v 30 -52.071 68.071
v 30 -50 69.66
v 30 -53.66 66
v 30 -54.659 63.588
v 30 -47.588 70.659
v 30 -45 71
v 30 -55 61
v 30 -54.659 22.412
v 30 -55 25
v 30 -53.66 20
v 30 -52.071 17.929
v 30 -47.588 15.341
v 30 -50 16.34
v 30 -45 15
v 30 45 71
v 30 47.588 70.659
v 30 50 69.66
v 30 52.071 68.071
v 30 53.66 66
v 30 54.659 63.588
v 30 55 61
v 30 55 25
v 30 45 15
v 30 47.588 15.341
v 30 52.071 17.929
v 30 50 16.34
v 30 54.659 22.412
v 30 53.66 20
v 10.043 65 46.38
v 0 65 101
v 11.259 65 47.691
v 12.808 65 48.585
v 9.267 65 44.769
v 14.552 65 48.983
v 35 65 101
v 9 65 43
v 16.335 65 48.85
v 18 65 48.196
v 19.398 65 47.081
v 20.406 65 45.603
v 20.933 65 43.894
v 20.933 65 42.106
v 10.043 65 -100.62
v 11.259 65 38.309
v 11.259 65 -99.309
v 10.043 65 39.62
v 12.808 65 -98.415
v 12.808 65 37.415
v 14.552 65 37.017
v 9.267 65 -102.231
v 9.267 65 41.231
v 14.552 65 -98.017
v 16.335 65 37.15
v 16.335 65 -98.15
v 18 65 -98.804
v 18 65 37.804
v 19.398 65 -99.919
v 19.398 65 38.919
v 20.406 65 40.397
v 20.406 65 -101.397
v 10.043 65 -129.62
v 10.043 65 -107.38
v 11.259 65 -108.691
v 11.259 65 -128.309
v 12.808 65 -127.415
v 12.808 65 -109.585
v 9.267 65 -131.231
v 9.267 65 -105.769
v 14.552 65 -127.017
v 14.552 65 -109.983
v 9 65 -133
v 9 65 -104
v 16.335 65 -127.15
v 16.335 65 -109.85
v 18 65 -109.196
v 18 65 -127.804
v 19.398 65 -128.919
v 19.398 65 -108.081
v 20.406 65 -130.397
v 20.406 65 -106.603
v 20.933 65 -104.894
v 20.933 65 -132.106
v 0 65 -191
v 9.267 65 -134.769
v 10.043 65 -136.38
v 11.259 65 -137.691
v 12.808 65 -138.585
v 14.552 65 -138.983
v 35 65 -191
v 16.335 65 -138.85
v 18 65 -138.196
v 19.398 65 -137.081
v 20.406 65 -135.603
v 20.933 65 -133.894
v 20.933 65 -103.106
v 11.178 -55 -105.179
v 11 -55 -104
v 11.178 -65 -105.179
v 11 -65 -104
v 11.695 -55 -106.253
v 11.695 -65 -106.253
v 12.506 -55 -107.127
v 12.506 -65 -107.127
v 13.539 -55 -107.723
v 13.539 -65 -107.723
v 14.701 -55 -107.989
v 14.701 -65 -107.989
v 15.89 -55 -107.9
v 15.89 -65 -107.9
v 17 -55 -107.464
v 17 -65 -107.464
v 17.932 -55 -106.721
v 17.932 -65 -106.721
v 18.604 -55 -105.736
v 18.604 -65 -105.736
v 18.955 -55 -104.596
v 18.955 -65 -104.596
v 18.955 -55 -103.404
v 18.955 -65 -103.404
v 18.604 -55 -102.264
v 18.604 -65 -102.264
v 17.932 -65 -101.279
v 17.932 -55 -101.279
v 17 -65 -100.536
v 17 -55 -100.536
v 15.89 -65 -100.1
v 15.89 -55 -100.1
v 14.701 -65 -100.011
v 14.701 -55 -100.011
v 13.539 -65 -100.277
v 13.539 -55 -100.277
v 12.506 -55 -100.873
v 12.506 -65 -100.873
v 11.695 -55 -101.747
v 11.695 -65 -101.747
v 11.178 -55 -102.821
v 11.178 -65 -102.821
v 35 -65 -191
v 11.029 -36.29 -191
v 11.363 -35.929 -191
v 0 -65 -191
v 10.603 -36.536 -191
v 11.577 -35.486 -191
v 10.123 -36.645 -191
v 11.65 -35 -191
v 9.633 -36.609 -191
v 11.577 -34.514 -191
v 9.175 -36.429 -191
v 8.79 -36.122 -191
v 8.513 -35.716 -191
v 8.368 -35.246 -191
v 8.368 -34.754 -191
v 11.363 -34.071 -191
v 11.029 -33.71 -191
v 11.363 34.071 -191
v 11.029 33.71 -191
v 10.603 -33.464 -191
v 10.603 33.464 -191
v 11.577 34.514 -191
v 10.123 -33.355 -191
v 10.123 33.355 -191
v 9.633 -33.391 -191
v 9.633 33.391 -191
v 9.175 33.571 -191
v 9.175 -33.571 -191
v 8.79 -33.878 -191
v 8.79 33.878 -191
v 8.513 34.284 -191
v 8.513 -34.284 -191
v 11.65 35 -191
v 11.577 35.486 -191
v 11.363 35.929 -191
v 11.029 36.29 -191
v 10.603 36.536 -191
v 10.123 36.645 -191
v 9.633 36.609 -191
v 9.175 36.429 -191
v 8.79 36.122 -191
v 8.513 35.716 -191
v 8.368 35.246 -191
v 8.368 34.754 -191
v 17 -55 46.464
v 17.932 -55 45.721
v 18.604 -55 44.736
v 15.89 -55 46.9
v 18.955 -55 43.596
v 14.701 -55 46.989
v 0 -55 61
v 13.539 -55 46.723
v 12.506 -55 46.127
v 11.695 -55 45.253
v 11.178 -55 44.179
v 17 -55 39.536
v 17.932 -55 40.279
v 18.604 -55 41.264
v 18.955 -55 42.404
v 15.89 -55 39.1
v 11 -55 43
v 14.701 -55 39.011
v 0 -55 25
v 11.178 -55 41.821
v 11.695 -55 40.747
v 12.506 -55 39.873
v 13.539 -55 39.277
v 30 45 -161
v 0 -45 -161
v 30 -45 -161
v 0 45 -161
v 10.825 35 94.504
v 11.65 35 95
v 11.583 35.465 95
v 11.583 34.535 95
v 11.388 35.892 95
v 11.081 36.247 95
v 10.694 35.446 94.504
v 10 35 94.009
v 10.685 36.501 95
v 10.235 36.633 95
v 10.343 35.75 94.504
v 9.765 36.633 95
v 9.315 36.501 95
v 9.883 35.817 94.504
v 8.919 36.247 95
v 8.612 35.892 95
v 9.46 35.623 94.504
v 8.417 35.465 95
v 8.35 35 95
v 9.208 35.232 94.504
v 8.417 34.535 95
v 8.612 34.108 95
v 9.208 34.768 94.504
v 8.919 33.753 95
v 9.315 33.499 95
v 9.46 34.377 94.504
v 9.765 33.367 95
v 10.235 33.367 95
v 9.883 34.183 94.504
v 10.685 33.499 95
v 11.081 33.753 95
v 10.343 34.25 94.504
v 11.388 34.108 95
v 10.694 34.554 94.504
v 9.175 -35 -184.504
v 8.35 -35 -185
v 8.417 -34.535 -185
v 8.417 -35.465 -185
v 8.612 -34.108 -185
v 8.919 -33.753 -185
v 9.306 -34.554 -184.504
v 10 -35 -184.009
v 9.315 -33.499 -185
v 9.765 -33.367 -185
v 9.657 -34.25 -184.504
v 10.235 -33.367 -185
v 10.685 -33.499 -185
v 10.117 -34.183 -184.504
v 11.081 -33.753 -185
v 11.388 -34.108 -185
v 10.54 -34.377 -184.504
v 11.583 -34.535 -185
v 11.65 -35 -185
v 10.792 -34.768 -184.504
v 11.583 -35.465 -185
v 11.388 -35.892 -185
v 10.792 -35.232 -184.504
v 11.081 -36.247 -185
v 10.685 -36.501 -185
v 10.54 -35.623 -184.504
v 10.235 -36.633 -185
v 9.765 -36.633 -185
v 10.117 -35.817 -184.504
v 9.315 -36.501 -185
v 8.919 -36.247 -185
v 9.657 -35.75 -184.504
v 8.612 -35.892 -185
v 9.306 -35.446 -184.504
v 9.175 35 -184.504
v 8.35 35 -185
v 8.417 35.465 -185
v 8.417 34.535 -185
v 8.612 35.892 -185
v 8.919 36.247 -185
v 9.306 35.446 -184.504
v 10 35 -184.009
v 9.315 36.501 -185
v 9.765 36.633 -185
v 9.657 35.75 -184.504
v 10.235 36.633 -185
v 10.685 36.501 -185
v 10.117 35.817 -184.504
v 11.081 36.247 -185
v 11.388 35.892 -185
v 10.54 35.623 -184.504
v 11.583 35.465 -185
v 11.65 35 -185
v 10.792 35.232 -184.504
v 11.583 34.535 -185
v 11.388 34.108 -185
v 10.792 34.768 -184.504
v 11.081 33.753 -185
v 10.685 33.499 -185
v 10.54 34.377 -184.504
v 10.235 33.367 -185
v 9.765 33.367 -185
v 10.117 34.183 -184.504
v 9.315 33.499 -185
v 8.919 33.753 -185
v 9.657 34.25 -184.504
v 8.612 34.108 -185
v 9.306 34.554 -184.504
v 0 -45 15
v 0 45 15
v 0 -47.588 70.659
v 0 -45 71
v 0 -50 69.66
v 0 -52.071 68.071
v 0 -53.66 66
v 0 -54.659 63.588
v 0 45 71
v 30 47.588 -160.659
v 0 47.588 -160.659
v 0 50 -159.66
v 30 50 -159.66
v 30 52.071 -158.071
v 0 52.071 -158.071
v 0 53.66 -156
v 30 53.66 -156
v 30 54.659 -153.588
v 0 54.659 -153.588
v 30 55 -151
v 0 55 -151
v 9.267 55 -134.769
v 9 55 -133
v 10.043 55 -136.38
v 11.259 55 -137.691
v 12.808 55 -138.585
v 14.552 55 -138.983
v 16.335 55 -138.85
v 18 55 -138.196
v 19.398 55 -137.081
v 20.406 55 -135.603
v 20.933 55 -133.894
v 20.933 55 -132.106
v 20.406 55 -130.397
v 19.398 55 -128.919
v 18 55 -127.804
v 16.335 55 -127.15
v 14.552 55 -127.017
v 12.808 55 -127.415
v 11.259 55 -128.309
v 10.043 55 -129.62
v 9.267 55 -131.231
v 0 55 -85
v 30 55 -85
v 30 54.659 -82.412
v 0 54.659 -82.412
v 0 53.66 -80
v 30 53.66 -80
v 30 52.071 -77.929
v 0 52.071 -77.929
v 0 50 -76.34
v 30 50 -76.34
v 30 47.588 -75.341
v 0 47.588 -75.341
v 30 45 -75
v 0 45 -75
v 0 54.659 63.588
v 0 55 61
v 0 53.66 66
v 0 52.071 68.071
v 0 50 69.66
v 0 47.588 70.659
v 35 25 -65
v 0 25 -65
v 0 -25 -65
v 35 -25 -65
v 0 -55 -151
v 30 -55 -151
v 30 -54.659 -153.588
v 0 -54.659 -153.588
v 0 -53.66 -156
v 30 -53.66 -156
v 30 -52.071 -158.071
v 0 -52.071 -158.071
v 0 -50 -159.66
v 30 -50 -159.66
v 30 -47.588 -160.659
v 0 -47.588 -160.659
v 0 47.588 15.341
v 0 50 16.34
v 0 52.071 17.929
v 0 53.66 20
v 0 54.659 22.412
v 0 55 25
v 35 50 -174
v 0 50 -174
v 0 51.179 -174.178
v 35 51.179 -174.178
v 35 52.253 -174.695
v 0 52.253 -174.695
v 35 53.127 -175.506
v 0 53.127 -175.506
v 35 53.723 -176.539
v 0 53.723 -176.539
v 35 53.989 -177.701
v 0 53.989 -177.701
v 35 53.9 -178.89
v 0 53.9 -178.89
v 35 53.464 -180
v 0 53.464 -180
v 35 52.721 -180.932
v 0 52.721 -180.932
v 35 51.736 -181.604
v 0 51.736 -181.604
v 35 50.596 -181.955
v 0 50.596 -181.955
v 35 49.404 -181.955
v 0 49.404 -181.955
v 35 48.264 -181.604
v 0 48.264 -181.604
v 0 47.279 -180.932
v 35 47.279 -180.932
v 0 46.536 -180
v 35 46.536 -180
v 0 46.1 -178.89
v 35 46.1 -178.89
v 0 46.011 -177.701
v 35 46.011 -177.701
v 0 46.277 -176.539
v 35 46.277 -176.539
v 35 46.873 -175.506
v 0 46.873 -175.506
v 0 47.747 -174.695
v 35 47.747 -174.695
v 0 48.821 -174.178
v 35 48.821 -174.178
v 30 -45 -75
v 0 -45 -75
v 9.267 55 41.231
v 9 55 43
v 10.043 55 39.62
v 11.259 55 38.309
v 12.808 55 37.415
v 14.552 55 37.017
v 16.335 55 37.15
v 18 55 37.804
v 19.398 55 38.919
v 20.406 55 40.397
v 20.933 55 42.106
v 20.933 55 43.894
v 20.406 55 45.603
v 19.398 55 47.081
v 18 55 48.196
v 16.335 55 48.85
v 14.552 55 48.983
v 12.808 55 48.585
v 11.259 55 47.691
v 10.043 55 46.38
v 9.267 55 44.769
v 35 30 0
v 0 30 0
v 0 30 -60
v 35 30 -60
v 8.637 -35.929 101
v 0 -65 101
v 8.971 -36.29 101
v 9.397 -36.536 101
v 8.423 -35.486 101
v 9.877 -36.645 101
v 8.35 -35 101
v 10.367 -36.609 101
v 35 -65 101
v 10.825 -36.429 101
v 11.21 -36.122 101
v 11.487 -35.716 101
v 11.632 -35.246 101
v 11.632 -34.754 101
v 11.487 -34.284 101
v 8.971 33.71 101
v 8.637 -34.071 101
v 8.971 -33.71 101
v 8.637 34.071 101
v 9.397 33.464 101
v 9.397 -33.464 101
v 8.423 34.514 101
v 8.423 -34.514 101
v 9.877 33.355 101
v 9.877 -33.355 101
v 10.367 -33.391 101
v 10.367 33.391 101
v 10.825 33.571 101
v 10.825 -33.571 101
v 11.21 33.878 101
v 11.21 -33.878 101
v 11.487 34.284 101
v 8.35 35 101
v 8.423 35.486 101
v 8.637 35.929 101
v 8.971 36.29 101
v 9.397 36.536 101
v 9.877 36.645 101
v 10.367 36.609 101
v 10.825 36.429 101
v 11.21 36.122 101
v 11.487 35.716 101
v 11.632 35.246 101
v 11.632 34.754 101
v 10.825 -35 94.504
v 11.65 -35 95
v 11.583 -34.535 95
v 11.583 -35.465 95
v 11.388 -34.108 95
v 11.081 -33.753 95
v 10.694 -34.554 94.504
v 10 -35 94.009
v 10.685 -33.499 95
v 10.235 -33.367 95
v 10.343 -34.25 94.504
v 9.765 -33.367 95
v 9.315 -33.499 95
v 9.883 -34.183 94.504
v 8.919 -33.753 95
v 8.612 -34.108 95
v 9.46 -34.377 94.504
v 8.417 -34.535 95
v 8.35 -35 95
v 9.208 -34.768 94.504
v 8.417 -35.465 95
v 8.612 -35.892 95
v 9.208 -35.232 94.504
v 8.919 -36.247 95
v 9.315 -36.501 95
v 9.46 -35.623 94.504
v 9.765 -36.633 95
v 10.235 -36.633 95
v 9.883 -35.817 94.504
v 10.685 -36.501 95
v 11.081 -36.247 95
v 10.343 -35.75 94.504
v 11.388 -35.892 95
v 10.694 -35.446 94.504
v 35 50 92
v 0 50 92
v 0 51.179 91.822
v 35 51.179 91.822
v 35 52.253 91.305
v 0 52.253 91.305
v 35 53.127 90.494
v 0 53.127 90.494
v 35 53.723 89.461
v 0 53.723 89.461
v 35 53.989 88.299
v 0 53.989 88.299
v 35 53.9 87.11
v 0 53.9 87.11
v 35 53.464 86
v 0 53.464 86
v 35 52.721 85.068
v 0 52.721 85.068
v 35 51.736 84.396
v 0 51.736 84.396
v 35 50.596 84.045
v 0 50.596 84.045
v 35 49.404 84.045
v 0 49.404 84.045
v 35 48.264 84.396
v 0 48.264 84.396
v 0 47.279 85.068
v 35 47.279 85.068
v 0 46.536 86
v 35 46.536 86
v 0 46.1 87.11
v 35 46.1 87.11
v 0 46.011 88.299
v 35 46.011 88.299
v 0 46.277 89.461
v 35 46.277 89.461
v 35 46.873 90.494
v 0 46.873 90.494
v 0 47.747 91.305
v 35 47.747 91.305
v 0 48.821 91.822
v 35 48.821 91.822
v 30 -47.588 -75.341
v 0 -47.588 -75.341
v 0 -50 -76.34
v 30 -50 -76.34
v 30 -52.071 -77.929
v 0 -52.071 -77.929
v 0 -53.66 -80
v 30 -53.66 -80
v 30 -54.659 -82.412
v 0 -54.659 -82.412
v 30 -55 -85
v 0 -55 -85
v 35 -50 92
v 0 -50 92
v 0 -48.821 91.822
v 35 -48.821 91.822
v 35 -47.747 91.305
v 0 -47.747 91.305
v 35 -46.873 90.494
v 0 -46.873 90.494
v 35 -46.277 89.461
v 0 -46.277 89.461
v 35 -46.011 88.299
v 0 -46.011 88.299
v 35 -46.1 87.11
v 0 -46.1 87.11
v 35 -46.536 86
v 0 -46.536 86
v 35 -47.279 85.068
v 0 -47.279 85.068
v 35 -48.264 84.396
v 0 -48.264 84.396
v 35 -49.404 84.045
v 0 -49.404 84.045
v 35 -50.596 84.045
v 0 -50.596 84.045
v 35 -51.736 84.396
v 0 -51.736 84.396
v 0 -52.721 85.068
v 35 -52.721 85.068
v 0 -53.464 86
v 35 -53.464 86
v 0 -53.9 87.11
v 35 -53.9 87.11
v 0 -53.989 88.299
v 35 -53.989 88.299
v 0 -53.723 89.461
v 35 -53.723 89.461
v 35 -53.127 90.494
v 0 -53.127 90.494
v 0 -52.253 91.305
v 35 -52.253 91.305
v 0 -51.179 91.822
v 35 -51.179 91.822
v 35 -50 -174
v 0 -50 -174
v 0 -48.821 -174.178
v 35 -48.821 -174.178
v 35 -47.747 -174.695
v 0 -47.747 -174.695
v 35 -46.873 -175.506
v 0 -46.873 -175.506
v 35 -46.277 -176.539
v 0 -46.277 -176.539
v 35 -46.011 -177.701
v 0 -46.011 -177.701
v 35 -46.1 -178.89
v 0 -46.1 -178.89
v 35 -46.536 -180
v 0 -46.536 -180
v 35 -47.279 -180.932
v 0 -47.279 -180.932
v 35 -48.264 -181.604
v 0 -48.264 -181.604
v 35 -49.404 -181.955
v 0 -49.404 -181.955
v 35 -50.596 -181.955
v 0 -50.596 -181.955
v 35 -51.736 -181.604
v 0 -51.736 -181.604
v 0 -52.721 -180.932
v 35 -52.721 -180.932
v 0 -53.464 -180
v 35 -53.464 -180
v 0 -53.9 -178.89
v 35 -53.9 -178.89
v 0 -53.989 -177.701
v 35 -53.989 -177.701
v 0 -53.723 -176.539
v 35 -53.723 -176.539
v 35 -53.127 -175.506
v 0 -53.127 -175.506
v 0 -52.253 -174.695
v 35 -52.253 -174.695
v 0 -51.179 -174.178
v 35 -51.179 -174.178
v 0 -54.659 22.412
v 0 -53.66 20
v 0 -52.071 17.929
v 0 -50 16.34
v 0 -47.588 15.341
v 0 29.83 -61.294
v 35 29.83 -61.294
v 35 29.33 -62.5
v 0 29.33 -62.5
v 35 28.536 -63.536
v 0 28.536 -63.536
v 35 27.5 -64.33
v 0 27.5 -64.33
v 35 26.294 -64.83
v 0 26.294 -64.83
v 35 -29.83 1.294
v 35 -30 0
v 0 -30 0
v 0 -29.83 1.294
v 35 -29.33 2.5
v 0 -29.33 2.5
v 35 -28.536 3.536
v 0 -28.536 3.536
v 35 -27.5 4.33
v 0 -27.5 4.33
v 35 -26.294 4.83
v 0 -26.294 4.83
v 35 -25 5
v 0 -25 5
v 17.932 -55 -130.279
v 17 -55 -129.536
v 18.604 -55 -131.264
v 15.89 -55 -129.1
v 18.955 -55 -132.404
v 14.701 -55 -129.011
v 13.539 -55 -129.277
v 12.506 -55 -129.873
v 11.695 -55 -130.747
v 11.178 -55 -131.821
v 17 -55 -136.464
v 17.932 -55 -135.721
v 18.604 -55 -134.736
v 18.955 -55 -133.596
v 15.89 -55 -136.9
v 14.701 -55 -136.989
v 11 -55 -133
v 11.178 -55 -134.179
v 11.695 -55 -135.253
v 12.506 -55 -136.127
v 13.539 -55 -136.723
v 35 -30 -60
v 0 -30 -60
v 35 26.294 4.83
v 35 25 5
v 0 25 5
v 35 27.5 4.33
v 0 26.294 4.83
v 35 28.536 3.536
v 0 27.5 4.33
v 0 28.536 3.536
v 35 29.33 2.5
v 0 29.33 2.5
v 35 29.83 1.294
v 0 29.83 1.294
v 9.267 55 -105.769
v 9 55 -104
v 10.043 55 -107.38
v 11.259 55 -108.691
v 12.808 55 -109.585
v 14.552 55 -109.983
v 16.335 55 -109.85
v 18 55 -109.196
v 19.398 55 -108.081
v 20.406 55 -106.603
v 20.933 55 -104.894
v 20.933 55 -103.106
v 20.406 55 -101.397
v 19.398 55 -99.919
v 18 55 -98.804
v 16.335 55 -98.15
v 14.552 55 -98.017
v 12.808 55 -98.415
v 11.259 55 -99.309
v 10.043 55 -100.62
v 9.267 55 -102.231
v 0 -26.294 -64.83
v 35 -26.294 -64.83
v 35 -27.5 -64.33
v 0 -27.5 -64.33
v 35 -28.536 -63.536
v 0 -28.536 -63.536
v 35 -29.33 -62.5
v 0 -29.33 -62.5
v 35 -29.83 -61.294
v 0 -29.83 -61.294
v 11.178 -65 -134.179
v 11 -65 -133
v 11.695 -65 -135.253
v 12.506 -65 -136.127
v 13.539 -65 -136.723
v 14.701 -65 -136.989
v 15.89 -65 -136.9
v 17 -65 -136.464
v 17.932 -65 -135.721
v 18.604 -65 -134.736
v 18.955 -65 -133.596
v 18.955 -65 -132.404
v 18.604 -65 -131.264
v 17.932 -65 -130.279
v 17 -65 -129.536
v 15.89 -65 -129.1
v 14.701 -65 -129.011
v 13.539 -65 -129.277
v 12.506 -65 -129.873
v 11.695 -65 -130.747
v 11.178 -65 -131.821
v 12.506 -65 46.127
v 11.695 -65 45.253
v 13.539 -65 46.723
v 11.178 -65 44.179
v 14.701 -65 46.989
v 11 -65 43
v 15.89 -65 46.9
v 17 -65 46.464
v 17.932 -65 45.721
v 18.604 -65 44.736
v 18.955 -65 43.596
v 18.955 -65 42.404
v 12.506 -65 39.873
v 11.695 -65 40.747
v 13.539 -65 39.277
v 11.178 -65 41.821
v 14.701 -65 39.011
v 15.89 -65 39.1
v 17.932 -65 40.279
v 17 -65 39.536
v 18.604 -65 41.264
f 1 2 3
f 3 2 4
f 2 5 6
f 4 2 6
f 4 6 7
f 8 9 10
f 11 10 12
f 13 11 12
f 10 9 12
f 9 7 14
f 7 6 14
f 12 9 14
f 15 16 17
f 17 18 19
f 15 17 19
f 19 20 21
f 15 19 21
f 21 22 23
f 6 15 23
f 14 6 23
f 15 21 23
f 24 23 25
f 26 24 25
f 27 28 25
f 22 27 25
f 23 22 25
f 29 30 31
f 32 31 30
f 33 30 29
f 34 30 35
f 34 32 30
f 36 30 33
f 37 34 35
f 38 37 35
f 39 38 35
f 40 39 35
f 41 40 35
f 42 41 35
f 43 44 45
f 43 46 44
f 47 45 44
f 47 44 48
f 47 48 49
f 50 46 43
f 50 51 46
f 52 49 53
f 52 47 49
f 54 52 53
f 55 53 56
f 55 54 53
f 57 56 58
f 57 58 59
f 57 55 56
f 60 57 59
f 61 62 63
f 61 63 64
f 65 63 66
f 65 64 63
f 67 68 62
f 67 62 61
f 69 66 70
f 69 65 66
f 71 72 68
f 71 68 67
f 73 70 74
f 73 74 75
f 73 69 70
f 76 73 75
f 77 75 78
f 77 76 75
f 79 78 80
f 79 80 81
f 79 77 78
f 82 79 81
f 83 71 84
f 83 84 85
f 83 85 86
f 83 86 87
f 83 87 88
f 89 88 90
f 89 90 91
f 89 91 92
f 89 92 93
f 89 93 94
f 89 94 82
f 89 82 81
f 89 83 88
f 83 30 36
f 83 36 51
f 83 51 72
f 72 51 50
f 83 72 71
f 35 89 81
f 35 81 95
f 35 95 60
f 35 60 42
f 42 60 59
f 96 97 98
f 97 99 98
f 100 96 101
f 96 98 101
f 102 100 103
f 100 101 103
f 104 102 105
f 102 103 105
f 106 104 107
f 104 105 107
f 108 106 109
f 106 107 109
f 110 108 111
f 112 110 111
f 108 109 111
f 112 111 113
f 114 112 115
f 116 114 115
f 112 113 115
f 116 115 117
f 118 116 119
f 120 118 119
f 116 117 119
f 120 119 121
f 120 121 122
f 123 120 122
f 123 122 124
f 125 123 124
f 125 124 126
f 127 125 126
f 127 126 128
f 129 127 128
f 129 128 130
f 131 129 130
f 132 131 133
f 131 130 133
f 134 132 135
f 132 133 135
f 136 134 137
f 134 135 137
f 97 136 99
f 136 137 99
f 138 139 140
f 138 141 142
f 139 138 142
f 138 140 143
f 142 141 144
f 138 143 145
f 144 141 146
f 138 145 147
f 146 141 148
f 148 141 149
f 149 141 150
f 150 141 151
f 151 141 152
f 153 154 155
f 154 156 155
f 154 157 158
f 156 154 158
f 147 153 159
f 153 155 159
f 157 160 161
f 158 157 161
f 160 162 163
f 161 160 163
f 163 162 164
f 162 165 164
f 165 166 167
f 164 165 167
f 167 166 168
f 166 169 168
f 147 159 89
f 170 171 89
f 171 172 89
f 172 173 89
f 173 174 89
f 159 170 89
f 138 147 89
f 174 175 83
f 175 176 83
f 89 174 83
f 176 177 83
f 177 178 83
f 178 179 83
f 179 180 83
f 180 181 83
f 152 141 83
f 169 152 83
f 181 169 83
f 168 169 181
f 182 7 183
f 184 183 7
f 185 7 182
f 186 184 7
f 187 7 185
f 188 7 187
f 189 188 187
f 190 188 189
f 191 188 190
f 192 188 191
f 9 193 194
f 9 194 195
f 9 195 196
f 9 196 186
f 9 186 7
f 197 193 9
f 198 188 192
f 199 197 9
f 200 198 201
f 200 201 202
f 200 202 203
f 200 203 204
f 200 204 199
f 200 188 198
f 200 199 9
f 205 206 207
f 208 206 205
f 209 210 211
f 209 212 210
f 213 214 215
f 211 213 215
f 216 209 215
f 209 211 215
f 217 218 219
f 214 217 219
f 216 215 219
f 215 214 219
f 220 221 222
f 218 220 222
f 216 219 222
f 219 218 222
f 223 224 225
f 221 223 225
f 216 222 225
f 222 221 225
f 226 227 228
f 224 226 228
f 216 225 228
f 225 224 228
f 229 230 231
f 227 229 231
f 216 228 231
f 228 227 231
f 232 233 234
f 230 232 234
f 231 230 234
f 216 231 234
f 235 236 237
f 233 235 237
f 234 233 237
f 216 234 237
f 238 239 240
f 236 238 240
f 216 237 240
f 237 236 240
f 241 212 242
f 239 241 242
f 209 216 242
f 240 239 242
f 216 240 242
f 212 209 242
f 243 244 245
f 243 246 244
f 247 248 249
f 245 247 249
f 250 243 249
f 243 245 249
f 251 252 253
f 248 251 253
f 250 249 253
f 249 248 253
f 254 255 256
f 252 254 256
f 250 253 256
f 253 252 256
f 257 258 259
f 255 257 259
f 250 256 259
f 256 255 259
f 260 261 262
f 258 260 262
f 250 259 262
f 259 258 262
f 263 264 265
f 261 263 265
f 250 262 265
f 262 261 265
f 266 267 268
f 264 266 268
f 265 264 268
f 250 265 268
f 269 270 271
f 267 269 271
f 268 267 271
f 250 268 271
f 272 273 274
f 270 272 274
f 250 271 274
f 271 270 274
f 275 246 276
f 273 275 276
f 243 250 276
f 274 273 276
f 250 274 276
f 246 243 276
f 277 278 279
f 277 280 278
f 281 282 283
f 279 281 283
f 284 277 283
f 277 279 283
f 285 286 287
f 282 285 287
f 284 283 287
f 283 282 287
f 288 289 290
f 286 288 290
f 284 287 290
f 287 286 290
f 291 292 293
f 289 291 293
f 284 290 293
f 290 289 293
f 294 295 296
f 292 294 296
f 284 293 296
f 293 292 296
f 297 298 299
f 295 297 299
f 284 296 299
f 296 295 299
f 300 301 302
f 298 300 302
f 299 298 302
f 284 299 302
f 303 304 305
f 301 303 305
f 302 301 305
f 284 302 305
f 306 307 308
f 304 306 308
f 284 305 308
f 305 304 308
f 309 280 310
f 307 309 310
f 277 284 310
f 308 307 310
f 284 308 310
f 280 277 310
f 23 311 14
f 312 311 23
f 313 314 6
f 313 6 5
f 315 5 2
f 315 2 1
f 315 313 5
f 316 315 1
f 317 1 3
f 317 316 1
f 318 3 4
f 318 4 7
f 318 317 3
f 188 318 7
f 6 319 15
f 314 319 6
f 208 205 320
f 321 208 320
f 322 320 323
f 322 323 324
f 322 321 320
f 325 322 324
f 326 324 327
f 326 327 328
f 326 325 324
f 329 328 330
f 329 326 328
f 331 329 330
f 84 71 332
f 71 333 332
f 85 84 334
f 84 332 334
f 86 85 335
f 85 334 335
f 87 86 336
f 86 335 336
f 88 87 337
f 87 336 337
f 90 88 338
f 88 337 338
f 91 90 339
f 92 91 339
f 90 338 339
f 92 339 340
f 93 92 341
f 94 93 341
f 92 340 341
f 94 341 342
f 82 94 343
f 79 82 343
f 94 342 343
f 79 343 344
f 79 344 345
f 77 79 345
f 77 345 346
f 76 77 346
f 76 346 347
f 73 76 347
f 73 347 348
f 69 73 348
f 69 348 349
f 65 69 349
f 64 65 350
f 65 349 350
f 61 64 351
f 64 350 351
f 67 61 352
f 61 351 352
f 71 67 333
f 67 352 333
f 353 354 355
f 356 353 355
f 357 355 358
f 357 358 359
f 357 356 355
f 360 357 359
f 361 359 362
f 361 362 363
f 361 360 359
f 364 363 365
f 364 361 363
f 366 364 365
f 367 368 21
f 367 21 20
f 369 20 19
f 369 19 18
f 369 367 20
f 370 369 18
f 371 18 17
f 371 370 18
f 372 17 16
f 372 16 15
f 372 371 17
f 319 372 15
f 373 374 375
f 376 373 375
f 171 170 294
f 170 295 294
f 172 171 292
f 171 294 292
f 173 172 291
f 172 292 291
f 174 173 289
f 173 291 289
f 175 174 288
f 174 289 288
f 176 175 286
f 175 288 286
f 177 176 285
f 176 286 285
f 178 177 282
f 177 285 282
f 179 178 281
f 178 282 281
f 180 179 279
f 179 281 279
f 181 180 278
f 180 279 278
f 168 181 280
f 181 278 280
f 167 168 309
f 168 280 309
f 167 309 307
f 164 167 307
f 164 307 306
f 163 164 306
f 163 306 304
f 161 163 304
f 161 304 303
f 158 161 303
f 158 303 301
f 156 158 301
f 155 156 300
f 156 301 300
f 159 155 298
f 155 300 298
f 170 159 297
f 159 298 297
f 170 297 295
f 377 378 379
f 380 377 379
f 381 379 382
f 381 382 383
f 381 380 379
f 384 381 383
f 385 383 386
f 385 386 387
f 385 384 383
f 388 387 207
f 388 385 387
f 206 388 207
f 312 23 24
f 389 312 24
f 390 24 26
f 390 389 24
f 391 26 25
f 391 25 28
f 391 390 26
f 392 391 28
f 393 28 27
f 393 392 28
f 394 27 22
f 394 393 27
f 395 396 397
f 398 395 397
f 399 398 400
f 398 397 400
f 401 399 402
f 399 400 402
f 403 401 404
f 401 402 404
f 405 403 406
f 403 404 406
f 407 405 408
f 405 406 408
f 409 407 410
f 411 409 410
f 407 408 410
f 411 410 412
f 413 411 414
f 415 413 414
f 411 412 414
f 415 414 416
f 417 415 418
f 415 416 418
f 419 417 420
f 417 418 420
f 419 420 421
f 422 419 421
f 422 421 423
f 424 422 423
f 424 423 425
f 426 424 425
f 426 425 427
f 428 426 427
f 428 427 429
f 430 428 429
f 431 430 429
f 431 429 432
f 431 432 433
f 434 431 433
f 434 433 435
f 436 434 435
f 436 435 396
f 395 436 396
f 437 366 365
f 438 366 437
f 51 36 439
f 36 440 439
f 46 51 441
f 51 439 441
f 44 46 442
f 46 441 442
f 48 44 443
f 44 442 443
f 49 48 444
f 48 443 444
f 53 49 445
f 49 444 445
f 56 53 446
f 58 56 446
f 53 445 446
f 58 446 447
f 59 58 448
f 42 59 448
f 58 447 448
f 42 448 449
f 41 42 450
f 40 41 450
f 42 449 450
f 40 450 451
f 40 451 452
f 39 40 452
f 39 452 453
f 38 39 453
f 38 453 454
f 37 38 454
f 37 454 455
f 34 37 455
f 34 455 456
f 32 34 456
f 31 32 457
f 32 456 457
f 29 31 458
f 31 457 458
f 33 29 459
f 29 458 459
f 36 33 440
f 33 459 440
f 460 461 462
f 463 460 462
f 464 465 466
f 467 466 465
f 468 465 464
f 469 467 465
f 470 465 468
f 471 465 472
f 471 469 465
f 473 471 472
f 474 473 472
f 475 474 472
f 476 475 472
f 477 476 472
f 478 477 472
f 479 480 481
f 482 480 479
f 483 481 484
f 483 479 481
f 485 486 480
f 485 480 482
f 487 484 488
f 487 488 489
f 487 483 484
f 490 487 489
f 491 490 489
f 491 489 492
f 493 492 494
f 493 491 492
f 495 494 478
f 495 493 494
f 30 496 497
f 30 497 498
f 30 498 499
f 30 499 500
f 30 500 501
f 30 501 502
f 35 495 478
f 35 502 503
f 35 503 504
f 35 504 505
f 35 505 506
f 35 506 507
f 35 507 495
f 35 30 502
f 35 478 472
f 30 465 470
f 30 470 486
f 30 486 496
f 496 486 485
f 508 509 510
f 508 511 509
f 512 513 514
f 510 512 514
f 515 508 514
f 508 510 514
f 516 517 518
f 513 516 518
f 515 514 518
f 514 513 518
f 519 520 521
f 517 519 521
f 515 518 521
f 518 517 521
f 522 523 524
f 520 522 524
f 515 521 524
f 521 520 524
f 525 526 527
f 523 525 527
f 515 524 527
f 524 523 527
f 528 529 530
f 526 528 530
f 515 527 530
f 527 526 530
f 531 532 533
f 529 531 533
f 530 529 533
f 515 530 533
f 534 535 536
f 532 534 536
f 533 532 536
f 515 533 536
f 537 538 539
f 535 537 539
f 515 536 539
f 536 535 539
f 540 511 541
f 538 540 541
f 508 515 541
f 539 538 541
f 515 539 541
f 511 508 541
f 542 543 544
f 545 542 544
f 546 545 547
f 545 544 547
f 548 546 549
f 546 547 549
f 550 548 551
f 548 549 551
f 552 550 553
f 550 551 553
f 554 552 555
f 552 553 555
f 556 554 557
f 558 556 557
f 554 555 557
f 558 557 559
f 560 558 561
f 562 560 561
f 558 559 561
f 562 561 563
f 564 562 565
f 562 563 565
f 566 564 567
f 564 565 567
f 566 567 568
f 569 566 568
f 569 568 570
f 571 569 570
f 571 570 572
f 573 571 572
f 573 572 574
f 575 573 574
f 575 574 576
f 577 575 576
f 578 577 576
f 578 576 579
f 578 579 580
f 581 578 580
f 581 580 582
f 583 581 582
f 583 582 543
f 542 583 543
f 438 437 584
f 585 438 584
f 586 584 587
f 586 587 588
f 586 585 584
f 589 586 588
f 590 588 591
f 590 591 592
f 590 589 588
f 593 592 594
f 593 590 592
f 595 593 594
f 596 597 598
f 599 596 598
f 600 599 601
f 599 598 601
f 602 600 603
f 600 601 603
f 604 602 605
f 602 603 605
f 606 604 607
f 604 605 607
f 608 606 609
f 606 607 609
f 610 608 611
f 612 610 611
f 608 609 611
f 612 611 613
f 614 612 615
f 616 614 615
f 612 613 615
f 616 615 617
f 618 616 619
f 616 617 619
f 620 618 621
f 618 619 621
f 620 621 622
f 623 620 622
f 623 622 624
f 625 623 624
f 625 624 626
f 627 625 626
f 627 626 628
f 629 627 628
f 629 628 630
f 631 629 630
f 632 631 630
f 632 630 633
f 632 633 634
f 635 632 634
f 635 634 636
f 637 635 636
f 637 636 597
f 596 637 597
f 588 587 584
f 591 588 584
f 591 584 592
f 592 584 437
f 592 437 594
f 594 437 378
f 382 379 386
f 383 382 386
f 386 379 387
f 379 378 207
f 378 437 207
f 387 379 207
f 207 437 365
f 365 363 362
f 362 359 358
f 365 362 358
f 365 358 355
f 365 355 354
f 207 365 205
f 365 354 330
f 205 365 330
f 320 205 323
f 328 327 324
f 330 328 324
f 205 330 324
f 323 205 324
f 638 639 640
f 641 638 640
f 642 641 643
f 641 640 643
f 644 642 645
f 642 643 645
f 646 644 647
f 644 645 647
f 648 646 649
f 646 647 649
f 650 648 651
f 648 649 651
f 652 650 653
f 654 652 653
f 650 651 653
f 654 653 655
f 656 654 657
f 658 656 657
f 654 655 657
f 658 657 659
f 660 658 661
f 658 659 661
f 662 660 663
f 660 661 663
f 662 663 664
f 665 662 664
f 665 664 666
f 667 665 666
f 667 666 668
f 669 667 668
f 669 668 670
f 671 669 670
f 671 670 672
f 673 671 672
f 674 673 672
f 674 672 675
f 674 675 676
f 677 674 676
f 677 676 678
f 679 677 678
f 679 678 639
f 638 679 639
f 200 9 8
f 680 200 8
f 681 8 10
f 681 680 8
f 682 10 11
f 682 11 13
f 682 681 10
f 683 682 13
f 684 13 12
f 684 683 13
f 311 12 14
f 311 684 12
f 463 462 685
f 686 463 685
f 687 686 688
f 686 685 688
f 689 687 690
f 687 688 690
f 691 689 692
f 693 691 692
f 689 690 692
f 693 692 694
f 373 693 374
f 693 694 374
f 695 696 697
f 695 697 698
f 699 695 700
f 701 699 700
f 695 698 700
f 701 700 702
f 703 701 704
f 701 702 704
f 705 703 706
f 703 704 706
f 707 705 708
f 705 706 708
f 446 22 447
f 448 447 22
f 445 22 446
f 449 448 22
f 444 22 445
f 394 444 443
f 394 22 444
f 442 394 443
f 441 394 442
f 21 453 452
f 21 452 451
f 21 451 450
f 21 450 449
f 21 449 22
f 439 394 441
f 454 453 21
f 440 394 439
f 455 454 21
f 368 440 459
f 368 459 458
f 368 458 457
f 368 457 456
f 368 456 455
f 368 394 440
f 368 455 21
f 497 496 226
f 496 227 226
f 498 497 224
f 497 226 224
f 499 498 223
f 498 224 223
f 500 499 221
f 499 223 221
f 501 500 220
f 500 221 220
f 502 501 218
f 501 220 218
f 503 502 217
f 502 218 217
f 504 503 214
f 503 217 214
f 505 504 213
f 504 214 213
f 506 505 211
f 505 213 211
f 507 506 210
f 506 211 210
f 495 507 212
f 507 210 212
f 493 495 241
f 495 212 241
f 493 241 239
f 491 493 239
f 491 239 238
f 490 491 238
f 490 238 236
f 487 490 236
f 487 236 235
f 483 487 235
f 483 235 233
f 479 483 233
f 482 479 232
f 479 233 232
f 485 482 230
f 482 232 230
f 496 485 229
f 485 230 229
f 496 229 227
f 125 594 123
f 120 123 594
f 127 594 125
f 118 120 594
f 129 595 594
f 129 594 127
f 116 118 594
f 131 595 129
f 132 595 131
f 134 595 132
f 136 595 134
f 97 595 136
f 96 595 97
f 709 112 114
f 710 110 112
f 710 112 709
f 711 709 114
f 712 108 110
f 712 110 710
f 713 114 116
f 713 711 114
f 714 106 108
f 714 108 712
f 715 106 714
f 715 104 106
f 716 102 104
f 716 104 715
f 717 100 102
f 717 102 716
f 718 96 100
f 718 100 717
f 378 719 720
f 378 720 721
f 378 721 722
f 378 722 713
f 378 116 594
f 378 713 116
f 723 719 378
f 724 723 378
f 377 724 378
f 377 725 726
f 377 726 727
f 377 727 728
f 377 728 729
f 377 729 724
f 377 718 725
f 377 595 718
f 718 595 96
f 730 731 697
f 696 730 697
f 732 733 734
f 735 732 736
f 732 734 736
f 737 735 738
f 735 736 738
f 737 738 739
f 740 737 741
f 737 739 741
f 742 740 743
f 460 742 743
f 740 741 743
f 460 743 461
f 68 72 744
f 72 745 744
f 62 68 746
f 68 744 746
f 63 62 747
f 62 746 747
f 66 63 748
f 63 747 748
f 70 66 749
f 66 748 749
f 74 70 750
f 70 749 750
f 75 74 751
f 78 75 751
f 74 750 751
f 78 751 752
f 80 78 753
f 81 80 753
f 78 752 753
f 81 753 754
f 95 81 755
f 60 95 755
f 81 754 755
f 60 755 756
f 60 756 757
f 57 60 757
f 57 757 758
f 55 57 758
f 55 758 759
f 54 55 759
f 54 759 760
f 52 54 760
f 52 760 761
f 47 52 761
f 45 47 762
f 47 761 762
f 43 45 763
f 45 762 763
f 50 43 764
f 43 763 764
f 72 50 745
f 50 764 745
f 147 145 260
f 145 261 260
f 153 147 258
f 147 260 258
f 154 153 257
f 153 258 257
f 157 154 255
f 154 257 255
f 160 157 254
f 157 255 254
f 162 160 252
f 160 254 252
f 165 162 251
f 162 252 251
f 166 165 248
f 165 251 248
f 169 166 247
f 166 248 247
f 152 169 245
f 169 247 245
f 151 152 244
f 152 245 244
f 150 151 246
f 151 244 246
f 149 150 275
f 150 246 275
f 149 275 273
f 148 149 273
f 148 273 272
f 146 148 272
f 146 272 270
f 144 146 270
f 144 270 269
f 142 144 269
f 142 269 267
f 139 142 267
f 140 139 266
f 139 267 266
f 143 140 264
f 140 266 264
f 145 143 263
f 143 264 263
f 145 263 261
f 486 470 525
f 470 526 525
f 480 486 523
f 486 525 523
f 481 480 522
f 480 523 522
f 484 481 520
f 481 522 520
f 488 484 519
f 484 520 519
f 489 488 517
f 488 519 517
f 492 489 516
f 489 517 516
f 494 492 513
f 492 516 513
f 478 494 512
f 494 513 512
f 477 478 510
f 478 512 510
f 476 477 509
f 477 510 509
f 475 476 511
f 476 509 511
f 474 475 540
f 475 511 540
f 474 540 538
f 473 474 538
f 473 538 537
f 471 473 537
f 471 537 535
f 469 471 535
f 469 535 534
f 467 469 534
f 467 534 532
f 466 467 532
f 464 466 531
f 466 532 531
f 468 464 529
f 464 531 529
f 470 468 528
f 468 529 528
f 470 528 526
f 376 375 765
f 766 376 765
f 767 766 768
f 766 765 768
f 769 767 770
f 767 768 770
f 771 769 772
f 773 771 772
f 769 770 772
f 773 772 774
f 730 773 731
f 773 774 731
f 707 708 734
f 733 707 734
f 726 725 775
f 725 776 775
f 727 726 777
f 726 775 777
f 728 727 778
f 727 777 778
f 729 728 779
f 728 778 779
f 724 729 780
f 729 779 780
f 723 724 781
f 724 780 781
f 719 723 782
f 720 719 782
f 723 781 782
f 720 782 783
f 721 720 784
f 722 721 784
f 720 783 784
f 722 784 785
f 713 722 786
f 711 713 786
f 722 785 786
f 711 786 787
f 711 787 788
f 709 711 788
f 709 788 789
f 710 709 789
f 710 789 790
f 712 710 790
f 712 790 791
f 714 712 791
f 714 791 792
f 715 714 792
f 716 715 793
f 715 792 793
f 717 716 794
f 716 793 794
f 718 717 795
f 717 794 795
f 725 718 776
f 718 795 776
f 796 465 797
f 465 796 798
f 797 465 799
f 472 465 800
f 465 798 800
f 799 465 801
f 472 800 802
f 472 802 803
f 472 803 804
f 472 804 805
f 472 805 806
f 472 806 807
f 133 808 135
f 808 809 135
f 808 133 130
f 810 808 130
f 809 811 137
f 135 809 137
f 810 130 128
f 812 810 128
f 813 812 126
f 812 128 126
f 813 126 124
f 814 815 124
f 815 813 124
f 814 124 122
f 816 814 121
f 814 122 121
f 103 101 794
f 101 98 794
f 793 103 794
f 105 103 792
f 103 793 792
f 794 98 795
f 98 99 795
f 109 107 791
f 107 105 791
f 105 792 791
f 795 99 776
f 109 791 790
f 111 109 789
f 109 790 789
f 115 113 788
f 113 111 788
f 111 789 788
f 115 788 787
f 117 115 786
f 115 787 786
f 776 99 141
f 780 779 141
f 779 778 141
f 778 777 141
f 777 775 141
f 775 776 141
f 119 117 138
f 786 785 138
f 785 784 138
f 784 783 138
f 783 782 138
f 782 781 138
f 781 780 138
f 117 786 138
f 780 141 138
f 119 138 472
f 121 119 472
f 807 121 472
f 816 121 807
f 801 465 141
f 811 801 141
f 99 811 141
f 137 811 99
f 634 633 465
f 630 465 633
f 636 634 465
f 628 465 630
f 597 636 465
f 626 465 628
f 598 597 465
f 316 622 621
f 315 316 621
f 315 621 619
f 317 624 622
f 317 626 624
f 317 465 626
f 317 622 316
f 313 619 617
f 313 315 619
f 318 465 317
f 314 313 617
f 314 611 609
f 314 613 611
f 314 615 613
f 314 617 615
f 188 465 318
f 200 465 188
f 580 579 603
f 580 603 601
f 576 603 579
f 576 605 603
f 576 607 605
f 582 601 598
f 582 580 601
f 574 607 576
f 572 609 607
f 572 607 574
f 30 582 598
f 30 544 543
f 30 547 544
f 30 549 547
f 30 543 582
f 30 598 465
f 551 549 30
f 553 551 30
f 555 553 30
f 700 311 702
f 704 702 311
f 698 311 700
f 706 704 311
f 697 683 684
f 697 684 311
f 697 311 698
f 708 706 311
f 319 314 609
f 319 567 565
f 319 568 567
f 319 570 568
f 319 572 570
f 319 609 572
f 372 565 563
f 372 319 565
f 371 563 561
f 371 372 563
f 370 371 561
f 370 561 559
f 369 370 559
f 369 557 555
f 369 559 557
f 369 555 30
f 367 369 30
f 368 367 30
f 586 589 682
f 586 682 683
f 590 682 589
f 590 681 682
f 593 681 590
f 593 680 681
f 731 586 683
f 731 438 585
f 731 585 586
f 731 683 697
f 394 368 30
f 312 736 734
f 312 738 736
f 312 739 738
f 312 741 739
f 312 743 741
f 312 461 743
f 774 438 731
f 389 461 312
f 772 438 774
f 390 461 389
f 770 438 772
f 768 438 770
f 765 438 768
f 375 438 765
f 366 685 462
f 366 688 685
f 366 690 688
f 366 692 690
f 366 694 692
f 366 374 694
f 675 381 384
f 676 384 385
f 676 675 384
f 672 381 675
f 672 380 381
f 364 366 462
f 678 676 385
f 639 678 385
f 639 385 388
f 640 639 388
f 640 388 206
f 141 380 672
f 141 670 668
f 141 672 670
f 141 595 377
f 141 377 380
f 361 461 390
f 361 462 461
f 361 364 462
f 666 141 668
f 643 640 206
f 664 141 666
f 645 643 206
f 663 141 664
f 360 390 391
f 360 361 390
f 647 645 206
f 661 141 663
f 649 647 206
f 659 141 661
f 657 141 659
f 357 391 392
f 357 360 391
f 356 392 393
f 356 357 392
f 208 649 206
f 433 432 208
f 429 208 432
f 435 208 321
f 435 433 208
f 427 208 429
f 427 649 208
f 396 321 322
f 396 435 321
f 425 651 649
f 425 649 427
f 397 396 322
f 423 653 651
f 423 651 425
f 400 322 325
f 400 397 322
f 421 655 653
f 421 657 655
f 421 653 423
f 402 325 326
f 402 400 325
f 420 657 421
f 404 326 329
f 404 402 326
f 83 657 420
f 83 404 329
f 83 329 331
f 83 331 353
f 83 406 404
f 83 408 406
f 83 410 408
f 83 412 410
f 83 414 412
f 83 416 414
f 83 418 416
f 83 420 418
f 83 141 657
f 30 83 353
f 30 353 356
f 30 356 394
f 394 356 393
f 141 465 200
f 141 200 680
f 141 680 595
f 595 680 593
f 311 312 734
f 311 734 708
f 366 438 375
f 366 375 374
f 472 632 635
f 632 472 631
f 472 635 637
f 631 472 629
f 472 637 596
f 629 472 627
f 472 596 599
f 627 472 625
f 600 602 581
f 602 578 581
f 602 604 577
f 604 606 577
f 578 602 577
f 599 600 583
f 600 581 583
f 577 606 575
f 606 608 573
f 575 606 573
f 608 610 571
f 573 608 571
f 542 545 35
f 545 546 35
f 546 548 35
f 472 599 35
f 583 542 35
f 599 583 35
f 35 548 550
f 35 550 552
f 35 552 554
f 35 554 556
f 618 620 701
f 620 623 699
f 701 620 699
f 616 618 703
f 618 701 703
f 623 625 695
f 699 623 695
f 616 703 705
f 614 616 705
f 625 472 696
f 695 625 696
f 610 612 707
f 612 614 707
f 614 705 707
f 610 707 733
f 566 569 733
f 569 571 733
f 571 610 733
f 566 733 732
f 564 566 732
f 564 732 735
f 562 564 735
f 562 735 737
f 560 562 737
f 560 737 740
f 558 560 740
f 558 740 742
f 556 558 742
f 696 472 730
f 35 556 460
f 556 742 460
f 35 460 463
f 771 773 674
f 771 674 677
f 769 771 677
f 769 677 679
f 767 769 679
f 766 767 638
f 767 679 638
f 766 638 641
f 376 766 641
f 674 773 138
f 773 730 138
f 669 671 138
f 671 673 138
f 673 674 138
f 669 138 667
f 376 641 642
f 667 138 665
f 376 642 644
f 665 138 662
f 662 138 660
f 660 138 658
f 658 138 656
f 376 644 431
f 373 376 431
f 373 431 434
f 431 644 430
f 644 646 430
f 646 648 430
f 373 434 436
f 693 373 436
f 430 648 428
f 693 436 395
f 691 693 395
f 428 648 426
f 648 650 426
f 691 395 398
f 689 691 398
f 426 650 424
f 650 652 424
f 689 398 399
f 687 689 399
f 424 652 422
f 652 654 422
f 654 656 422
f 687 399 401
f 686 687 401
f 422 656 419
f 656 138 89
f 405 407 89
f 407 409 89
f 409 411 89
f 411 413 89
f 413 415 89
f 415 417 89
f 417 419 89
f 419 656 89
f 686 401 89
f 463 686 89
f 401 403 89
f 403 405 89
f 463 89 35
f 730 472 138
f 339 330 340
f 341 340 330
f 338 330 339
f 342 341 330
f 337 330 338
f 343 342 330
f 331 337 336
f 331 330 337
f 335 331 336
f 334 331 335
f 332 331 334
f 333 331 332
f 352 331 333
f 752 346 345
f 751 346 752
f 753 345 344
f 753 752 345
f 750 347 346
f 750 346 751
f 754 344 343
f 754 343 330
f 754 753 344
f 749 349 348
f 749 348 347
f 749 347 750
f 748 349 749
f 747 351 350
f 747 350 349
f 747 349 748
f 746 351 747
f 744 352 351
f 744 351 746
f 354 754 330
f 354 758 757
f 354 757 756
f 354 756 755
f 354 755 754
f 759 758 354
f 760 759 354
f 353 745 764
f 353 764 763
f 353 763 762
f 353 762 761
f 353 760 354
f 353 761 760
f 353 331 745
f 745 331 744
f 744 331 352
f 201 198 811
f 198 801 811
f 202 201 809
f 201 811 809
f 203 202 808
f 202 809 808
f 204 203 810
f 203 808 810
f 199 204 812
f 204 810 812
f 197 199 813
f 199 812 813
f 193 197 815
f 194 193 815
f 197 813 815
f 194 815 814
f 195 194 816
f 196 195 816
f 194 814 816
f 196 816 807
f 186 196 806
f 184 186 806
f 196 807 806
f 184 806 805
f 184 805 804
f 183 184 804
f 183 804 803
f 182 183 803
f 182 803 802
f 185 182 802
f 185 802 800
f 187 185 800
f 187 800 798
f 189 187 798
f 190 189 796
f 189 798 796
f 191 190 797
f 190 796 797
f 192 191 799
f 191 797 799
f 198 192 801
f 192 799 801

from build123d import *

# Parameters (mm, degrees)
SKETCH2_W                   = 191
SKETCH2_H                   = 130
BOSS_EXTRUDE1_DEPTH         = 35
SKETCH10_W                  = 35
SKETCH10_H                  = 130
BOSS_EXTRUDE2_DEPTH         = 101
TAP_DRILL_FOR_M4_TAP2_D     = 3.3
TAP_DRILL_FOR_M4_TAP2_DEPTH = 6
TAP_DRILL_FOR_M4_TAP2_TIP   = 0.991420021
TAP_DRILL_FOR_M4_TAP3_D     = 3.3
TAP_DRILL_FOR_M4_TAP3_DEPTH = 6
TAP_DRILL_FOR_M4_TAP3_TIP   = 0.991420021
CUT_EXTRUDE1_DEPTH          = 205.770603359
F_8_0MM_DOWEL_HOLE1_D       = 8
CUT_EXTRUDE3_DEPTH          = 30
F_8_0MM_DOWEL_HOLE2_D       = 8
F_8_0MM_DOWEL_HOLE2_DEPTH   = 10
F_8_0MM_DOWEL_HOLE2_TIP     = 2.403442476
F_12_0MM_DOWEL_HOLE1_D      = 12
F_12_0MM_DOWEL_HOLE1_DEPTH  = 10
F_12_0MM_DOWEL_HOLE1_TIP    = 3.605163714


with BuildPart() as part:
    # Sketch2 → Boss-Extrude1 (new body)
    with BuildSketch(Plane(origin=(0, 0, 0), x_dir=(0, 0, -1), z_dir=(1, 0, 0))):
        with Locations((95.5, 0)):
            Rectangle(SKETCH2_W, SKETCH2_H)
    extrude(amount=BOSS_EXTRUDE1_DEPTH)

    # Sketch10 → Boss-Extrude2 (add)
    with BuildSketch(Plane.XY):
        with Locations((17.5, 0)):
            Rectangle(SKETCH10_W, SKETCH10_H)
    extrude(amount=BOSS_EXTRUDE2_DEPTH)

    # Tap Drill for M4 Tap2
    with Locations(Plane(origin=(0, 0, -191), x_dir=(-1, 0, 0), z_dir=(0, 0, -1))):
        with Locations((-40, 35), (-10, 35), (-10, -35), (-40, -35)):
            Hole(TAP_DRILL_FOR_M4_TAP2_D / 2, depth=TAP_DRILL_FOR_M4_TAP2_DEPTH)
            with Locations((0, 0, -(TAP_DRILL_FOR_M4_TAP2_DEPTH + TAP_DRILL_FOR_M4_TAP2_TIP / 2))):  # 118° drill point
                Cone(0, TAP_DRILL_FOR_M4_TAP2_D / 2, TAP_DRILL_FOR_M4_TAP2_TIP, mode=Mode.SUBTRACT)

    # Tap Drill for M4 Tap3
    with Locations(Plane.XY.offset(101)):
        with Locations((10, 35), (40, 35), (40, -35), (10, -35)):
            Hole(TAP_DRILL_FOR_M4_TAP3_D / 2, depth=TAP_DRILL_FOR_M4_TAP3_DEPTH)
            with Locations((0, 0, -(TAP_DRILL_FOR_M4_TAP3_DEPTH + TAP_DRILL_FOR_M4_TAP3_TIP / 2))):  # 118° drill point
                Cone(0, TAP_DRILL_FOR_M4_TAP3_D / 2, TAP_DRILL_FOR_M4_TAP3_TIP, mode=Mode.SUBTRACT)

    # Sketch23 → Cut-Extrude1 (cut, through all)
    with BuildSketch(Plane.ZY):
        with BuildLine():
            Line((-65, 25), (-65, -25))
            ThreePointArc((-65, -25), (-63.535533906, -28.535533906), (-60, -30))
            Line((-60, -30), (0, -30))
            ThreePointArc((0, -30), (3.535533906, -28.535533906), (5, -25))
            Line((5, -25), (5, 25))
            ThreePointArc((5, 25), (3.535533906, 28.535533906), (0, 30))
            Line((0, 30), (-60, 30))
            ThreePointArc((-60, 30), (-63.535533906, 28.535533906), (-65, 25))
        make_face()
    extrude(amount=-CUT_EXTRUDE1_DEPTH, mode=Mode.SUBTRACT)

    # Ø8.0mm Dowel Hole1 (through all)
    with Locations(Plane(origin=(35, 0, 0), x_dir=(0, 0, -1), z_dir=(1, 0, 0))):
        with Locations((-88, 50), (-88, -50), (178, -50), (178, 50)):
            Hole(F_8_0MM_DOWEL_HOLE1_D / 2)

    # Sketch35 → Cut-Extrude3 (cut)
    with BuildSketch(Plane.ZY):
        with BuildLine():
            Line((-151, 55), (-85, 55))
            ThreePointArc((-85, 55), (-77.928932188, 52.071067812), (-75, 45))
            Line((-75, 45), (-75, -45))
            ThreePointArc((-75, -45), (-77.928932188, -52.071067812), (-85, -55))
            Line((-85, -55), (-151, -55))
            ThreePointArc((-151, -55), (-158.071067812, -52.071067812), (-161, -45))
            Line((-161, -45), (-161, 45))
            ThreePointArc((-161, 45), (-158.071067812, 52.071067812), (-151, 55))
        make_face()
        with BuildLine():
            Line((25, 55), (61, 55))
            ThreePointArc((61, 55), (68.071067812, 52.071067812), (71, 45))
            Line((71, 45), (71, -45))
            ThreePointArc((71, -45), (68.071067812, -52.071067812), (61, -55))
            Line((61, -55), (25, -55))
            ThreePointArc((25, -55), (17.928932188, -52.071067812), (15, -45))
            Line((15, -45), (15, 45))
            ThreePointArc((15, 45), (17.928932188, 52.071067812), (25, 55))
        make_face()
    extrude(amount=-CUT_EXTRUDE3_DEPTH, mode=Mode.SUBTRACT)

    # Ø8.0mm Dowel Hole2
    with Locations(Plane(origin=(0, -55, 0), x_dir=(1, 0, 0), z_dir=(0, 1, 0))):
        with Locations((15, 133), (15, 104), (15, -43)):
            Hole(F_8_0MM_DOWEL_HOLE2_D / 2, depth=F_8_0MM_DOWEL_HOLE2_DEPTH)
            with Locations((0, 0, -(F_8_0MM_DOWEL_HOLE2_DEPTH + F_8_0MM_DOWEL_HOLE2_TIP / 2))):  # 118° drill point
                Cone(0, F_8_0MM_DOWEL_HOLE2_D / 2, F_8_0MM_DOWEL_HOLE2_TIP, mode=Mode.SUBTRACT)

    # Ø12.0mm Dowel Hole1
    with Locations(Plane(origin=(0, 65, 0), x_dir=(1, 0, 0), z_dir=(0, 1, 0))):
        with Locations((15, 133), (15, 104), (15, -43)):
            Hole(F_12_0MM_DOWEL_HOLE1_D / 2, depth=F_12_0MM_DOWEL_HOLE1_DEPTH)
            with Locations((0, 0, -(F_12_0MM_DOWEL_HOLE1_DEPTH + F_12_0MM_DOWEL_HOLE1_TIP / 2))):  # 118° drill point
                Cone(0, F_12_0MM_DOWEL_HOLE1_D / 2, F_12_0MM_DOWEL_HOLE1_TIP, mode=Mode.SUBTRACT)


solid = part.part
